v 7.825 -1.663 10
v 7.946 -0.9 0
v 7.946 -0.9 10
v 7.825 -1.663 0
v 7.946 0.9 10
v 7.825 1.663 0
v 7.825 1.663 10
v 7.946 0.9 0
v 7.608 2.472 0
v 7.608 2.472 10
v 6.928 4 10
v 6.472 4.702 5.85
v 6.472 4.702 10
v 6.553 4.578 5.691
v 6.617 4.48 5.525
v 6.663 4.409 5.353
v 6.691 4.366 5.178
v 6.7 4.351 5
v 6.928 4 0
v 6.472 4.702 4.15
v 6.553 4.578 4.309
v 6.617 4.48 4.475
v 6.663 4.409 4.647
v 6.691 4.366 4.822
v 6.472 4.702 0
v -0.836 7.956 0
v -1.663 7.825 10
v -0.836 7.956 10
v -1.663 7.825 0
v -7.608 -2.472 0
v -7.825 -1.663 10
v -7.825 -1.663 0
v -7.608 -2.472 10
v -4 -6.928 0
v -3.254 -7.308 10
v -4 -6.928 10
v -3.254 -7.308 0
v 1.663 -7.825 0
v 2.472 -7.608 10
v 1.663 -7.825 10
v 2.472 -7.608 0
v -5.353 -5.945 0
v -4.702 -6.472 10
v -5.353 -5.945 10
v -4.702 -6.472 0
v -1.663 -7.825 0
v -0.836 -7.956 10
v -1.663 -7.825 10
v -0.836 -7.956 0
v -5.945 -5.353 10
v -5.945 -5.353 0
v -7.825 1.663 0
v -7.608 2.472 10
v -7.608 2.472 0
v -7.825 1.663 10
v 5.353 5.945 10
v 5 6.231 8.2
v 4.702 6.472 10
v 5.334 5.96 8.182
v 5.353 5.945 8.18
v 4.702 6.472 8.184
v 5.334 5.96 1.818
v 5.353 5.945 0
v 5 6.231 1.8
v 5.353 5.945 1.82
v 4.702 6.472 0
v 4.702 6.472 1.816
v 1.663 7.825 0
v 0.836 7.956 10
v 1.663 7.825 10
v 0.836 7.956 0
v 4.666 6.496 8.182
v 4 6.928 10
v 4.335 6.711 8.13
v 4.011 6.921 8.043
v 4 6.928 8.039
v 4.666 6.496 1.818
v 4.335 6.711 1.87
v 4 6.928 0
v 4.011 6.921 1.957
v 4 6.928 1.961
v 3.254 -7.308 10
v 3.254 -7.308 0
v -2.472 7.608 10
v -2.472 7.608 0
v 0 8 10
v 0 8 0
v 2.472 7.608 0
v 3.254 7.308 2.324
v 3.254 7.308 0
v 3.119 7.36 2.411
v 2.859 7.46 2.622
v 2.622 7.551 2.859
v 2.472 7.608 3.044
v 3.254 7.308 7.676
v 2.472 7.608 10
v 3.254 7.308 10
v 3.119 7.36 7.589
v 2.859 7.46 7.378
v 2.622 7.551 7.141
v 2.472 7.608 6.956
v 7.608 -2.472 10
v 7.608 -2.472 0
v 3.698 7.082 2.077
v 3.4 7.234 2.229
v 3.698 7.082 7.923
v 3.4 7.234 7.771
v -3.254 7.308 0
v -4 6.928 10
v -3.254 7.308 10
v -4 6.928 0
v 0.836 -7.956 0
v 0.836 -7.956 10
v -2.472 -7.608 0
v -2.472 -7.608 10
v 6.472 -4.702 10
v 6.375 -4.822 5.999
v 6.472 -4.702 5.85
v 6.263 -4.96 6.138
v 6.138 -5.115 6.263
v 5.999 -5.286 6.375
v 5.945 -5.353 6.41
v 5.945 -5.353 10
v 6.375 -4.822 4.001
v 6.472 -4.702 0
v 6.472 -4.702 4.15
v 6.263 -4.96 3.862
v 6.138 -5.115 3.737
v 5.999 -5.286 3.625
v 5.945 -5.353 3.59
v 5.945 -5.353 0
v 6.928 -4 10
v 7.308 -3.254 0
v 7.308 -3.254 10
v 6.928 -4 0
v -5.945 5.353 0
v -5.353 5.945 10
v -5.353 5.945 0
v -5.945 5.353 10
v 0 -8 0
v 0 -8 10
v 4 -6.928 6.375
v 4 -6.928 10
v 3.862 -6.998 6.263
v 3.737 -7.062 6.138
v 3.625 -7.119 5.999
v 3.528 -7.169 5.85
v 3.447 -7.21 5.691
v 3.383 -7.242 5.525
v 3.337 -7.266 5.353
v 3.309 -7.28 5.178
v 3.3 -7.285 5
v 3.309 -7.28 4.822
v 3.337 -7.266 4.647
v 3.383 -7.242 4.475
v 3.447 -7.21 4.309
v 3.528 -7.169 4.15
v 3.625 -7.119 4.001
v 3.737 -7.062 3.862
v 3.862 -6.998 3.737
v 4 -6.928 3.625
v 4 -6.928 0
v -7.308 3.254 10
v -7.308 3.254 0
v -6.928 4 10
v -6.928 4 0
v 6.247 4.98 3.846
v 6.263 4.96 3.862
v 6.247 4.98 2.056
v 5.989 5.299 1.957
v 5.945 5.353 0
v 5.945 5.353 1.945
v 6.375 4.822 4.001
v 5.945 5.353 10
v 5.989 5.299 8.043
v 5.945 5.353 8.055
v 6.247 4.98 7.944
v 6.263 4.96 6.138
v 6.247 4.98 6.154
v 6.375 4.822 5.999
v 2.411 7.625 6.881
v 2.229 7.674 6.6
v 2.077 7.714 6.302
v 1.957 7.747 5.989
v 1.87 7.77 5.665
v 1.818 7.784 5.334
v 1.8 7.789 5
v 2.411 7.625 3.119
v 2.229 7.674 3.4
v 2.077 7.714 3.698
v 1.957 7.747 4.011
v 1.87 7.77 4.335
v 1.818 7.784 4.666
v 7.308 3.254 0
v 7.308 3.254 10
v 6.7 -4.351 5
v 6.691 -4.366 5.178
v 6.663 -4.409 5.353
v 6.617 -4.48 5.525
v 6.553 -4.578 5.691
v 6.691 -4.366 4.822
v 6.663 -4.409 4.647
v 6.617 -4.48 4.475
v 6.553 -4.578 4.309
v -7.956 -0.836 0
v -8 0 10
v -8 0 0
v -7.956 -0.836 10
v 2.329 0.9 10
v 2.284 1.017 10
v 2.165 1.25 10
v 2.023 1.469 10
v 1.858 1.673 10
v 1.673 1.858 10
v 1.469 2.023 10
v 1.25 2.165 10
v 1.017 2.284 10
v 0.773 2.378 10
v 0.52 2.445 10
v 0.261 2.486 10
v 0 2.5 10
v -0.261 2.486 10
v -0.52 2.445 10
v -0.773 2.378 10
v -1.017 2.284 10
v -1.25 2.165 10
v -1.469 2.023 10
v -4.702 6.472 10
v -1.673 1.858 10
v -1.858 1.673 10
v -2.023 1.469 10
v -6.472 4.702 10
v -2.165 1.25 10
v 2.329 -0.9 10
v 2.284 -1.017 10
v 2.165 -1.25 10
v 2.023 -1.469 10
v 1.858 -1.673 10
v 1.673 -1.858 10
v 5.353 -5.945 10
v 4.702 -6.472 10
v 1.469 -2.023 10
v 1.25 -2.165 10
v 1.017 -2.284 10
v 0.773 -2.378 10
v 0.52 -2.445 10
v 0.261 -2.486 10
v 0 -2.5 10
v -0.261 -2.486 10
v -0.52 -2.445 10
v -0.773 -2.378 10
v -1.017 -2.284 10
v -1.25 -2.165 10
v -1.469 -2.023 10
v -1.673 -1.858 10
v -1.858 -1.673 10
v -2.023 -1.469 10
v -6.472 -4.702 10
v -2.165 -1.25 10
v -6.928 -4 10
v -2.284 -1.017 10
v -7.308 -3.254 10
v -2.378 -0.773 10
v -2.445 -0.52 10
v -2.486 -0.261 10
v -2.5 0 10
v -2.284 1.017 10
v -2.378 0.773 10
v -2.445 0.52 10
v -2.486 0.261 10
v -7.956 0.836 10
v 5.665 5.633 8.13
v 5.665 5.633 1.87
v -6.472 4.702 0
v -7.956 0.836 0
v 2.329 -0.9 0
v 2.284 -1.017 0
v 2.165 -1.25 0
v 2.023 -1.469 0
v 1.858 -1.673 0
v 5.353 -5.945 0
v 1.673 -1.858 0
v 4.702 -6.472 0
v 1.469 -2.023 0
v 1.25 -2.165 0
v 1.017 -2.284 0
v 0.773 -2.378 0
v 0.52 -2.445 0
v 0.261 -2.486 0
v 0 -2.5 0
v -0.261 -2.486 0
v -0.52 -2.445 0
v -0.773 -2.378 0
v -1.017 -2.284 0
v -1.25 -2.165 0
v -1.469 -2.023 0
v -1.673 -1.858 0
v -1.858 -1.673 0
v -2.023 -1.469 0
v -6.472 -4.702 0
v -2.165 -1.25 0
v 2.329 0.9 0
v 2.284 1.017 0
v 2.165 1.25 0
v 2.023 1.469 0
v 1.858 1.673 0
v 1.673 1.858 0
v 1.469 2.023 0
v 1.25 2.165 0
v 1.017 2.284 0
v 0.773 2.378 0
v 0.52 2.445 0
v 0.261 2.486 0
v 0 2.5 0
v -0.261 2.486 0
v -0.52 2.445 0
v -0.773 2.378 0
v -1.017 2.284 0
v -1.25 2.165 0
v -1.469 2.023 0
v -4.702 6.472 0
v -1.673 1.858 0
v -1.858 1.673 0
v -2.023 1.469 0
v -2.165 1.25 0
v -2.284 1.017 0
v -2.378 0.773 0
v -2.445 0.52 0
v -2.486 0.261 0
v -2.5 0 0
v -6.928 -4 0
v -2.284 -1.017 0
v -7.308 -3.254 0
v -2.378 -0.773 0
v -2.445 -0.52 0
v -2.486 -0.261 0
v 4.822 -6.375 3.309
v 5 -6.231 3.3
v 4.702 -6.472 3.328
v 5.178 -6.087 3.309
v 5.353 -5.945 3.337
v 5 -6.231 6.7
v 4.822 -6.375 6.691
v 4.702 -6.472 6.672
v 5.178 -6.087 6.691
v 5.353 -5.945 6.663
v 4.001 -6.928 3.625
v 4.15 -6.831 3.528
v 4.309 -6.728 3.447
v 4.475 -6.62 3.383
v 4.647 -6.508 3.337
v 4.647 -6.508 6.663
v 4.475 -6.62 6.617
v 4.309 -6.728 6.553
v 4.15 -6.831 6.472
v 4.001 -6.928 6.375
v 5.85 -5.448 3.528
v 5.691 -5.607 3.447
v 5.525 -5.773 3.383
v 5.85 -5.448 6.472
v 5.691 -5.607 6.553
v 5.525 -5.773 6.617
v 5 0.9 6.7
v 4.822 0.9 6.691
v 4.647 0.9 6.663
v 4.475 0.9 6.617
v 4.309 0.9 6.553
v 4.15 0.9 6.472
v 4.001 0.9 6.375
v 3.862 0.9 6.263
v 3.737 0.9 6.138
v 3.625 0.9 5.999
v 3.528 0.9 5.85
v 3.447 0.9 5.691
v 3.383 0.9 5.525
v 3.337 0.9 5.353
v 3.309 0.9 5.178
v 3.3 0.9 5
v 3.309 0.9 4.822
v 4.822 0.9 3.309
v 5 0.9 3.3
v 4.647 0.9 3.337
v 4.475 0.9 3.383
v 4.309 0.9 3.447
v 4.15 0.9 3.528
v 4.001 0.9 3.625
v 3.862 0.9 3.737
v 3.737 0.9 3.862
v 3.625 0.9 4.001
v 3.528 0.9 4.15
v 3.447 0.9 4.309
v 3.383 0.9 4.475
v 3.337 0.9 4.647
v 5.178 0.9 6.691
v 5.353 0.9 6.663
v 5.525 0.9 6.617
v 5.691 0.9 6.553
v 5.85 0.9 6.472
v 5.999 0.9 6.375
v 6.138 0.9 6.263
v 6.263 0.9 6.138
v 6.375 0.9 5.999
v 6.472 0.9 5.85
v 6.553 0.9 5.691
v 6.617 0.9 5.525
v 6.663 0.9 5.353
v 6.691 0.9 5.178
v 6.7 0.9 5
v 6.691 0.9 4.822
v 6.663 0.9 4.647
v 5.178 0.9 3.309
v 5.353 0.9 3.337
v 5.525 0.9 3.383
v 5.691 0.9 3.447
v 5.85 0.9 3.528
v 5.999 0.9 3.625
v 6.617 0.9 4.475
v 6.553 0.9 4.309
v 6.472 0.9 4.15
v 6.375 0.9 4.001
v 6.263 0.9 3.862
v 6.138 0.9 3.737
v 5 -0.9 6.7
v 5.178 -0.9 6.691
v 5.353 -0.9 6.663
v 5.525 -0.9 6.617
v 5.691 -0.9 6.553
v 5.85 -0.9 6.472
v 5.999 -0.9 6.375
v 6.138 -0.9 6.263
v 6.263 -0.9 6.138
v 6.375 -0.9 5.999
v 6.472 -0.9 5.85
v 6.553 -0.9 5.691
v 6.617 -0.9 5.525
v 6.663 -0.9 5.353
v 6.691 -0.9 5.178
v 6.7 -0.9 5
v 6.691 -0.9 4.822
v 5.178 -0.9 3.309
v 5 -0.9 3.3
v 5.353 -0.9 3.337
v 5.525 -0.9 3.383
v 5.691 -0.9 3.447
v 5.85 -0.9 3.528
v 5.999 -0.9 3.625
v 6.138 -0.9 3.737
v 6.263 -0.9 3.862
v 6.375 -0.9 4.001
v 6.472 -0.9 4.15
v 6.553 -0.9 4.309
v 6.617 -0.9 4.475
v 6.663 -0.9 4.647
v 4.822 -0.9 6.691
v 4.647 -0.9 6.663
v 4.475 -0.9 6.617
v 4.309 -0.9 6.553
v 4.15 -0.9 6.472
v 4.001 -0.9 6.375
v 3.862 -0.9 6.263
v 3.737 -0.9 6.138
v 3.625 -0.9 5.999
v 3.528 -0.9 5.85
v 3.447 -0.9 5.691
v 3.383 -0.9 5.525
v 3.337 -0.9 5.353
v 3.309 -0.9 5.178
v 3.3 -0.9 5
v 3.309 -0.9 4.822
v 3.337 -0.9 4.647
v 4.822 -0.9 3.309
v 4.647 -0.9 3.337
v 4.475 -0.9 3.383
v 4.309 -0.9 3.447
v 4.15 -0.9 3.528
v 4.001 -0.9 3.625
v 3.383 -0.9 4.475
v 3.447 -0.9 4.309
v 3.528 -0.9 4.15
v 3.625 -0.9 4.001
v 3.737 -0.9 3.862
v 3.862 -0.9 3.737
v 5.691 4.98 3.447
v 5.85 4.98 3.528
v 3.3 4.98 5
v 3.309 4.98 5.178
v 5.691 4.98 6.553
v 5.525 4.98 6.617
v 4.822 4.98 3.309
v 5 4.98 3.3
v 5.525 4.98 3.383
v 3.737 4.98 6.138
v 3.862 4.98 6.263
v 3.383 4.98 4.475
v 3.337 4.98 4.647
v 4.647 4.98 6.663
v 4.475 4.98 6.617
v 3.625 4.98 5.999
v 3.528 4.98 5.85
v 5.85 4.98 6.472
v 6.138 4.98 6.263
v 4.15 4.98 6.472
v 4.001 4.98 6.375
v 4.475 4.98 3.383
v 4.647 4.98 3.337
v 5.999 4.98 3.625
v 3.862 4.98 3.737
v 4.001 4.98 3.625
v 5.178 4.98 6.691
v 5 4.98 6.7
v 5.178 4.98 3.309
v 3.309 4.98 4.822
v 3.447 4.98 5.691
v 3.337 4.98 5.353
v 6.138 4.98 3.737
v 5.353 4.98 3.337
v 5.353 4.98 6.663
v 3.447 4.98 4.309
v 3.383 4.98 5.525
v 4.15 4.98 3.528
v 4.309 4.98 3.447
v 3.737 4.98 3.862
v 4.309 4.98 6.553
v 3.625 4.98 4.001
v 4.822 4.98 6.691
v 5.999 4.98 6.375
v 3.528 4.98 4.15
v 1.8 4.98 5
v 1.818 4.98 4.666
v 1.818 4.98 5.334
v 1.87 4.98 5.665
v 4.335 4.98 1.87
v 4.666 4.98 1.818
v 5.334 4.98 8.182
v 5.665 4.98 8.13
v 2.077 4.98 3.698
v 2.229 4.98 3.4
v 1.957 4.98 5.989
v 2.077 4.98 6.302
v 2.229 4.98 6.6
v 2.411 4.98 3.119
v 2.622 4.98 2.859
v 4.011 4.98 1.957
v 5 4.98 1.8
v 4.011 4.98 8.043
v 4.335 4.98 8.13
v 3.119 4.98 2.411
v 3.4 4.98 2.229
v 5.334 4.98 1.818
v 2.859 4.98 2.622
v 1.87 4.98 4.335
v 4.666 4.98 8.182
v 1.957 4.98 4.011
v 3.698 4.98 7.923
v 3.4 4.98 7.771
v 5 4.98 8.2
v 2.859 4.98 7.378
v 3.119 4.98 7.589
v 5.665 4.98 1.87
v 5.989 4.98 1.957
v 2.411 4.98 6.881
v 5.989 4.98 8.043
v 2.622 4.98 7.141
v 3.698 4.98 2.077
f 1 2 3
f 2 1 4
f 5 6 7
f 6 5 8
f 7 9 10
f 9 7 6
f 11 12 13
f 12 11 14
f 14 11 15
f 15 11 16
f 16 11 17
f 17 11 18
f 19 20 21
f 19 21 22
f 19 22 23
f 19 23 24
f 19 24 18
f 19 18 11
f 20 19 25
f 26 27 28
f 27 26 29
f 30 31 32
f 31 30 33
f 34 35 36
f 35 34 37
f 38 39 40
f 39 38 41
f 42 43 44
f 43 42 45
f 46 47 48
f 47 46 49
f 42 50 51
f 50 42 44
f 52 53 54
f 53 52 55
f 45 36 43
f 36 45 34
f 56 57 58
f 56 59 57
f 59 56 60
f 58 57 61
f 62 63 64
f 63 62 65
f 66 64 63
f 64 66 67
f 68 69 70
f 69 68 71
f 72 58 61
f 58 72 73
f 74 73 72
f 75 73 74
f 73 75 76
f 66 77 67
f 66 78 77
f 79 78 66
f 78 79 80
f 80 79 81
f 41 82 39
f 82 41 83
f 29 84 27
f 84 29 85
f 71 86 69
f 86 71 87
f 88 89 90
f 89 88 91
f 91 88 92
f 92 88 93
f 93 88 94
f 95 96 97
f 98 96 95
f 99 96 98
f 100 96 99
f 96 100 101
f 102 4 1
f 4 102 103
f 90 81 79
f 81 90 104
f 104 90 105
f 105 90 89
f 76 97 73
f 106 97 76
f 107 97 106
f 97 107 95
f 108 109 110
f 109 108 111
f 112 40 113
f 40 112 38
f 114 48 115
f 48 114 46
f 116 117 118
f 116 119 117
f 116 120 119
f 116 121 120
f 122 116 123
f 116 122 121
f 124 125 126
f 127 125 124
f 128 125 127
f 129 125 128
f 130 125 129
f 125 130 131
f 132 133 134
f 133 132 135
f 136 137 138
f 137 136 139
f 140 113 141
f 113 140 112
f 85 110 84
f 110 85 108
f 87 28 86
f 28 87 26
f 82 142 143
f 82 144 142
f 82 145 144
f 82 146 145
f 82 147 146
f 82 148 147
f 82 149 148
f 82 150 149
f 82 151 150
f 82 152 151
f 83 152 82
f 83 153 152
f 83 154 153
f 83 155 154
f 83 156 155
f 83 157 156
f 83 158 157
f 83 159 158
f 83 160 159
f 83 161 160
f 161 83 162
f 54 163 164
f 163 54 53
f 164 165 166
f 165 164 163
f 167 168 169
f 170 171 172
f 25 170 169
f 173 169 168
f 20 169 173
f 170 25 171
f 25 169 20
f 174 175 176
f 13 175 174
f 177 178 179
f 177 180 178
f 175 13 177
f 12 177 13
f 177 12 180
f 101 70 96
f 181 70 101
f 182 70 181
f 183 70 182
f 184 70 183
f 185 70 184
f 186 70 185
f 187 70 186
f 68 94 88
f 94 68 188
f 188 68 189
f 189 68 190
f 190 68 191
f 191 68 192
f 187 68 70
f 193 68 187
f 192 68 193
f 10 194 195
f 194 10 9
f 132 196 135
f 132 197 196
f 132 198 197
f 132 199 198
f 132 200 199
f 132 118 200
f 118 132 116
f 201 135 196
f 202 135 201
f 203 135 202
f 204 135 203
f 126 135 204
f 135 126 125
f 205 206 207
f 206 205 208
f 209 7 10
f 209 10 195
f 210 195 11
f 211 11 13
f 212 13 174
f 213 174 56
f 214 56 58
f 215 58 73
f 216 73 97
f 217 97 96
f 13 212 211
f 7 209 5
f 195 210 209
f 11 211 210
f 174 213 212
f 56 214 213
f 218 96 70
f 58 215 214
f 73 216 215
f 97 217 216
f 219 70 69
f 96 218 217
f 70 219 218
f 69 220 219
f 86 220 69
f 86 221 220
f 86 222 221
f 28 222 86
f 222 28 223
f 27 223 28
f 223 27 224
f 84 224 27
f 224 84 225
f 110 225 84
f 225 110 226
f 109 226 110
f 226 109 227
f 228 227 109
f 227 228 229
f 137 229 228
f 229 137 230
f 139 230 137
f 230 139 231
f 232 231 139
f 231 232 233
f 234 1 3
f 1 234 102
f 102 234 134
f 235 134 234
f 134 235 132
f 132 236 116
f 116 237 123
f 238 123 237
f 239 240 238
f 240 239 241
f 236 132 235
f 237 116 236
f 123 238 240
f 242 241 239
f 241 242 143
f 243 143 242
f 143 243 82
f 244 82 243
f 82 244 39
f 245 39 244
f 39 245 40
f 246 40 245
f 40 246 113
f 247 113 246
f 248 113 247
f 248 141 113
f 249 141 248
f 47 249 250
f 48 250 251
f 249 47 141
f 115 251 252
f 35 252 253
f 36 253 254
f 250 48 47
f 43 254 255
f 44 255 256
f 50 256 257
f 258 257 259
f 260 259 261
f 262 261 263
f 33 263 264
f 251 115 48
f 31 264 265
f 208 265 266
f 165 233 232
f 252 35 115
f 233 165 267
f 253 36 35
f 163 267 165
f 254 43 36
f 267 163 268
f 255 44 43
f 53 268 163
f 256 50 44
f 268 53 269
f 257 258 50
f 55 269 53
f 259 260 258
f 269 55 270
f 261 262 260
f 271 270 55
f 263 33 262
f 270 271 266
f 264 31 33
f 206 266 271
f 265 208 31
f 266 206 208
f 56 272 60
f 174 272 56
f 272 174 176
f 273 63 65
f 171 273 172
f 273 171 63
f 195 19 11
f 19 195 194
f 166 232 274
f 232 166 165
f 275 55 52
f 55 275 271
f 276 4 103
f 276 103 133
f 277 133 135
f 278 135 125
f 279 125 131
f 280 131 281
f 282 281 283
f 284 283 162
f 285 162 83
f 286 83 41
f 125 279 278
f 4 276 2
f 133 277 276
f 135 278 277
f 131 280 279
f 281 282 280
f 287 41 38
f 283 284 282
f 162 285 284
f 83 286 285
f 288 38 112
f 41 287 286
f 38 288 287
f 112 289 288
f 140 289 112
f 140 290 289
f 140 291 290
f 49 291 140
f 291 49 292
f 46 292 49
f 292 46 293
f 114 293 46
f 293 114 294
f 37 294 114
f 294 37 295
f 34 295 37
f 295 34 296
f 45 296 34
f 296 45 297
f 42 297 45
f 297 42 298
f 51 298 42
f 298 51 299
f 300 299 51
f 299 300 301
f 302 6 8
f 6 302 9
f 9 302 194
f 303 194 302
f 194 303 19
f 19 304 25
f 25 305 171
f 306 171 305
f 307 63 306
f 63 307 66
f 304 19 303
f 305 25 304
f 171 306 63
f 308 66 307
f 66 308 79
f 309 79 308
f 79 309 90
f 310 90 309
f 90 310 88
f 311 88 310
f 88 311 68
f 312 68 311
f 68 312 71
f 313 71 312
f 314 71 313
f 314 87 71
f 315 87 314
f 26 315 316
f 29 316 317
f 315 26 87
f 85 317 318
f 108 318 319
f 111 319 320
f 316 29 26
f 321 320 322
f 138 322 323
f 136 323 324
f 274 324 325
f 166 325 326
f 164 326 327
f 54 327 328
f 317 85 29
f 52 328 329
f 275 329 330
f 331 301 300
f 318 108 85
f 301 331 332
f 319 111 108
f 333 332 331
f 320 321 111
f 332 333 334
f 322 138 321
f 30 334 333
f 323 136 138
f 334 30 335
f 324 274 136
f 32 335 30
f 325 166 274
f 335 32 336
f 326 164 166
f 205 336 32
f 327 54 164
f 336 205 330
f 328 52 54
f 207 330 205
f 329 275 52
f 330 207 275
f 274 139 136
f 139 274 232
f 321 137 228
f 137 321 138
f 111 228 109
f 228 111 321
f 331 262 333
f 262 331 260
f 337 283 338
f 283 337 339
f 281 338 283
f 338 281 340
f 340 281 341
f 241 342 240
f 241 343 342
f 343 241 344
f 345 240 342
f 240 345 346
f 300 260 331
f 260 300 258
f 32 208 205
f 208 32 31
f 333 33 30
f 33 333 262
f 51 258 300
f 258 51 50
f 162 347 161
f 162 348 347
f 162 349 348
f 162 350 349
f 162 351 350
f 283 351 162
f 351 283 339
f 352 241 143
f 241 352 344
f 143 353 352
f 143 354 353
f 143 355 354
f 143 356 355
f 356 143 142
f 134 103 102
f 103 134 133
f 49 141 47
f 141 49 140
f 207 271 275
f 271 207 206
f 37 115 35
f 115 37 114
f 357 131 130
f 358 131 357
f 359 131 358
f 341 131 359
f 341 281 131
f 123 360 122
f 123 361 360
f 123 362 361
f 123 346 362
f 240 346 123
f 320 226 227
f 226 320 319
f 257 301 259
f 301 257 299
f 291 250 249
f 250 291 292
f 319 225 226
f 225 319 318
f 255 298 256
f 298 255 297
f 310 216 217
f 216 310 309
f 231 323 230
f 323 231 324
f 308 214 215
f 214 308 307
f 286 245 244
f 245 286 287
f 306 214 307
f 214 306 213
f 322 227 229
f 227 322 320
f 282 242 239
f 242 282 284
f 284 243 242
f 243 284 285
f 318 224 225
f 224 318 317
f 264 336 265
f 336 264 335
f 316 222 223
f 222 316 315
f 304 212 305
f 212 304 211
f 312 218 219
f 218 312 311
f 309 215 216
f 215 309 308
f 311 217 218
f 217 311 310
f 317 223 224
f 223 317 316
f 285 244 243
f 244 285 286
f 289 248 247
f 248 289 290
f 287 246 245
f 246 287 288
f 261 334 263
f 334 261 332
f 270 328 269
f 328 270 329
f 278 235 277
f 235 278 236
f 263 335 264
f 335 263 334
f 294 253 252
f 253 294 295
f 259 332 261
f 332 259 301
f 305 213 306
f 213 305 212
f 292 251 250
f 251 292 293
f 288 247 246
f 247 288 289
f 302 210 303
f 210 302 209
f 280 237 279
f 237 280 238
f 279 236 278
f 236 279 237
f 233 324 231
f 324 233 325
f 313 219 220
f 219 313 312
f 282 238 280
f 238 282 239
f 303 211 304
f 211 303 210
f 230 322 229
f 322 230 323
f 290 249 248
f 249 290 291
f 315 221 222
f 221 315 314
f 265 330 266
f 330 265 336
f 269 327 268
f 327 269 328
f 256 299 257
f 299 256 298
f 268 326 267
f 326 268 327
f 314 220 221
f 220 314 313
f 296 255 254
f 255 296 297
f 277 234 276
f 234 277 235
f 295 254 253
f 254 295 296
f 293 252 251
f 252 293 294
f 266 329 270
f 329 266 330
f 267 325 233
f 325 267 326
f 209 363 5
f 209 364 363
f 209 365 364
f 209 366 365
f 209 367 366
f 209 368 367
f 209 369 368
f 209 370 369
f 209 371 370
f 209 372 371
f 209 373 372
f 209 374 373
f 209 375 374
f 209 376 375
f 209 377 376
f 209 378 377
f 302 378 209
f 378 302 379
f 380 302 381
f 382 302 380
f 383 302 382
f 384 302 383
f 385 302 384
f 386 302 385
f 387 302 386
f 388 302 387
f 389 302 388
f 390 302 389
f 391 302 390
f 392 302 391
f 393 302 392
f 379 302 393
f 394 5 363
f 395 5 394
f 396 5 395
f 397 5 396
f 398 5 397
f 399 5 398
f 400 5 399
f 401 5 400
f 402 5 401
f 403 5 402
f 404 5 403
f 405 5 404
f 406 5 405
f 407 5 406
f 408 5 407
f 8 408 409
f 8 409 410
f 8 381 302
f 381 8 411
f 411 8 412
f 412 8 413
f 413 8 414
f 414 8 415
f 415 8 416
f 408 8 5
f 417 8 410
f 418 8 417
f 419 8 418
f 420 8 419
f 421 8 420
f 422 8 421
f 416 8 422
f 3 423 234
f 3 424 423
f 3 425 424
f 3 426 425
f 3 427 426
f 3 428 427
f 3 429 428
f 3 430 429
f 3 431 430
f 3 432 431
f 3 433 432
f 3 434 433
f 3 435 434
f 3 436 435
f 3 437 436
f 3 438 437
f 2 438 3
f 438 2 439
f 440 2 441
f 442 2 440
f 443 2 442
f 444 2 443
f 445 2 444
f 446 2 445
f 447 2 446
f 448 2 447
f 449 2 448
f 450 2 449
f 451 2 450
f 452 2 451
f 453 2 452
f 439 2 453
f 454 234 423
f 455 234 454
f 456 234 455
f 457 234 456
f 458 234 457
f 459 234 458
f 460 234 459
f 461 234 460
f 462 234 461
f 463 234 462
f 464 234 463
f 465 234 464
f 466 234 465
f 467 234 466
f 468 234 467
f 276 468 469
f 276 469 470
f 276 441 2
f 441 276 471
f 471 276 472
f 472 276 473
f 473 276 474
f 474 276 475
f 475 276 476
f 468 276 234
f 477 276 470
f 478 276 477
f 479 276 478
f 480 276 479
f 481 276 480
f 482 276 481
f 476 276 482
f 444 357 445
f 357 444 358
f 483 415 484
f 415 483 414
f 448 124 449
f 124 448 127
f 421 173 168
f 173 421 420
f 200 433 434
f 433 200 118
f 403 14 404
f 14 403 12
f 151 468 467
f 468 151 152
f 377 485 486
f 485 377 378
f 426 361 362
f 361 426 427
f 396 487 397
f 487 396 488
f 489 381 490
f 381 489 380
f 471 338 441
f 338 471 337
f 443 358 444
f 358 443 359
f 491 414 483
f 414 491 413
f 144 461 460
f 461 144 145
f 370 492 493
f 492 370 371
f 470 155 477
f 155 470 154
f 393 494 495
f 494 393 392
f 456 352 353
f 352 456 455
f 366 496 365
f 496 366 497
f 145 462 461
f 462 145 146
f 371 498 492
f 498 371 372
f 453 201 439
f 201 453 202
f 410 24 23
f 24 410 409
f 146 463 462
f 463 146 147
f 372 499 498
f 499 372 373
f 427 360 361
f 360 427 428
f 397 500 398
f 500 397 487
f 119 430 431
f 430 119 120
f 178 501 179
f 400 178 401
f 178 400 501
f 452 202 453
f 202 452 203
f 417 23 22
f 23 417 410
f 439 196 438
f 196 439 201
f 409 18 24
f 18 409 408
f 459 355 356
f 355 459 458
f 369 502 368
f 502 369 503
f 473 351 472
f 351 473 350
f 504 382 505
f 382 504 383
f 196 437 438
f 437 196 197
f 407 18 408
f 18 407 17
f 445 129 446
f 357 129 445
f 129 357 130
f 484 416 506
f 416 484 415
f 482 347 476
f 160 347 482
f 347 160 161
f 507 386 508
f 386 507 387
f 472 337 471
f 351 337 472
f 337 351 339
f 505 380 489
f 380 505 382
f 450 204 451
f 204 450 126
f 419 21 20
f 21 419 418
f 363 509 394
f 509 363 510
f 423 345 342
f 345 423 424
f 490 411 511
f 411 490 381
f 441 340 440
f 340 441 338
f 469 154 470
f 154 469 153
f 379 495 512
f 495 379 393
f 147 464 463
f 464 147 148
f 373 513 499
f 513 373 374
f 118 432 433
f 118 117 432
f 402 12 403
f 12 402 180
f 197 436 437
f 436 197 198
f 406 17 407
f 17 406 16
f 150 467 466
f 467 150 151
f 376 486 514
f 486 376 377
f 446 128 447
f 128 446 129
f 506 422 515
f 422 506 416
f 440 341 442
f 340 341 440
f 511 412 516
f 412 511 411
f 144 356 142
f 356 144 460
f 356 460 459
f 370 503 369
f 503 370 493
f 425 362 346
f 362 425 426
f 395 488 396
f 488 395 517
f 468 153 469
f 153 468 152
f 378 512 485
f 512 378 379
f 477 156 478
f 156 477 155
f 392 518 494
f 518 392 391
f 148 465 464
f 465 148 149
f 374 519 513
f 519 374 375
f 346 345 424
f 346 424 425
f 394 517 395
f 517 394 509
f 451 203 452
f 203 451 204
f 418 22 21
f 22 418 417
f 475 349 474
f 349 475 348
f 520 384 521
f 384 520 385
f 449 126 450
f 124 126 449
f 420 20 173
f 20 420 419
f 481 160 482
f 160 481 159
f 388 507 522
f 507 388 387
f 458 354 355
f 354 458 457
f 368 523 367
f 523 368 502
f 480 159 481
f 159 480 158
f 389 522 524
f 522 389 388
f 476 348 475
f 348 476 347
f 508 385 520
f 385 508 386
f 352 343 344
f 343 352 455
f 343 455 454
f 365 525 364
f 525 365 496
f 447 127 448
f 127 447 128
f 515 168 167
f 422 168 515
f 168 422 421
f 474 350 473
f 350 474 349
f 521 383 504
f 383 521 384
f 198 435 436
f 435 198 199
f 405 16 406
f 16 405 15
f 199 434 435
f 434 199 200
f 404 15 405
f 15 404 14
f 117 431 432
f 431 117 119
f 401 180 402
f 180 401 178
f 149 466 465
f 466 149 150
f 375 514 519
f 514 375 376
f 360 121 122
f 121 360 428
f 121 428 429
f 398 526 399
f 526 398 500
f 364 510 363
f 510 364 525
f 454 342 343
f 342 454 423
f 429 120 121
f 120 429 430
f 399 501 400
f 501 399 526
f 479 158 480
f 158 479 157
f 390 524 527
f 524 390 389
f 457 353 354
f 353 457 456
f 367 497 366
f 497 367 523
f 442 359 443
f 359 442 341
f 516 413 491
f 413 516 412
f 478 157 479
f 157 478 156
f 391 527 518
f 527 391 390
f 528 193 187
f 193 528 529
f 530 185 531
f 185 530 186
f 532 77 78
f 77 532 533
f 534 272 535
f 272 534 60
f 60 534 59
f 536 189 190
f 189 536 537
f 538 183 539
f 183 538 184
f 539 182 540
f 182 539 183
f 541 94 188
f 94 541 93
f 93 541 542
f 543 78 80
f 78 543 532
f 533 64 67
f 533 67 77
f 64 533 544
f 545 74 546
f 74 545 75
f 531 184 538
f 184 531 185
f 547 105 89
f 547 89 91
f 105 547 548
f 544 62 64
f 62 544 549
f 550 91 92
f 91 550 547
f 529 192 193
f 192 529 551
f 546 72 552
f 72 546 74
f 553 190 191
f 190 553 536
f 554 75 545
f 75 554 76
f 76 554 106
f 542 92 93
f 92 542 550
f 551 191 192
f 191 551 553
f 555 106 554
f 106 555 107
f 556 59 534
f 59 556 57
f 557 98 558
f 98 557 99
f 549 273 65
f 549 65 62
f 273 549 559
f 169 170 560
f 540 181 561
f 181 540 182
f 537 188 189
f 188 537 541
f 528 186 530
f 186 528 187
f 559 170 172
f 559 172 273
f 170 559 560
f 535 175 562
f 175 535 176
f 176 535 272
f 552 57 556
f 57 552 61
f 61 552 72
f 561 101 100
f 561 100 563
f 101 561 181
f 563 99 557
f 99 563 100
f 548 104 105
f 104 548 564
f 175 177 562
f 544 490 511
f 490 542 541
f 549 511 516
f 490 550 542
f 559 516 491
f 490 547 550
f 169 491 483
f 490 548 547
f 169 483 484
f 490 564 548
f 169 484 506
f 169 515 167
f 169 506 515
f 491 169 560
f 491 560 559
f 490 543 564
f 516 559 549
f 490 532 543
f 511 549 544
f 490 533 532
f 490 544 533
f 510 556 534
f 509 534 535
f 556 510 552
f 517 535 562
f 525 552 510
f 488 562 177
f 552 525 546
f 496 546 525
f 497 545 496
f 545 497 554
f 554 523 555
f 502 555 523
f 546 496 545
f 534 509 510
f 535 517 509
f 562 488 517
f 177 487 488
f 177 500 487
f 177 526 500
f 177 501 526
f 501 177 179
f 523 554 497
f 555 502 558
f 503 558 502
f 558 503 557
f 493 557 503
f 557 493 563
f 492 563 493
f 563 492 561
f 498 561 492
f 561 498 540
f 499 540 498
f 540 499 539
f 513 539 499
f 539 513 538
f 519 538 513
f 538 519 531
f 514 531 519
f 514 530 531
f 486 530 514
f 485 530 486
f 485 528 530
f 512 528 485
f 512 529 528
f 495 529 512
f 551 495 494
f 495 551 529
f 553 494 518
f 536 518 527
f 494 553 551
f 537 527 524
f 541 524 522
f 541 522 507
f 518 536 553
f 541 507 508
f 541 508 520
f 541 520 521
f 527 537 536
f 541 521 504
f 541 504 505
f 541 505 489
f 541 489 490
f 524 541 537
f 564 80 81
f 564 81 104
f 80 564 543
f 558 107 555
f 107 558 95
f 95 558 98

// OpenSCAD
// C-style split collar for 5 mm shaft.
$fn = 60;
eps = 0.02;
shaft_d = 5;
outer_d = 16;
width = 10;
slit_w = 1.8;
screw_d = 3.4;
difference() {
    cylinder(d = outer_d, h = width);
    translate([0, 0, -eps]) cylinder(d = shaft_d, h = width + 2 * eps);
    translate([0, -slit_w / 2, -eps]) cube([outer_d / 2 + eps, slit_w, width + 2 * eps]);
    translate([outer_d / 2 - 3, -outer_d / 2 - eps, width / 2]) rotate([-90, 0, 0]) cylinder(d = screw_d, h = outer_d + 2 * eps);
    translate([outer_d / 2 - 3, outer_d / 2 - 3 - eps, width / 2]) rotate([-90, 0, 0]) cylinder(d = screw_d + 3, h = 3 + 2 * eps);
}
